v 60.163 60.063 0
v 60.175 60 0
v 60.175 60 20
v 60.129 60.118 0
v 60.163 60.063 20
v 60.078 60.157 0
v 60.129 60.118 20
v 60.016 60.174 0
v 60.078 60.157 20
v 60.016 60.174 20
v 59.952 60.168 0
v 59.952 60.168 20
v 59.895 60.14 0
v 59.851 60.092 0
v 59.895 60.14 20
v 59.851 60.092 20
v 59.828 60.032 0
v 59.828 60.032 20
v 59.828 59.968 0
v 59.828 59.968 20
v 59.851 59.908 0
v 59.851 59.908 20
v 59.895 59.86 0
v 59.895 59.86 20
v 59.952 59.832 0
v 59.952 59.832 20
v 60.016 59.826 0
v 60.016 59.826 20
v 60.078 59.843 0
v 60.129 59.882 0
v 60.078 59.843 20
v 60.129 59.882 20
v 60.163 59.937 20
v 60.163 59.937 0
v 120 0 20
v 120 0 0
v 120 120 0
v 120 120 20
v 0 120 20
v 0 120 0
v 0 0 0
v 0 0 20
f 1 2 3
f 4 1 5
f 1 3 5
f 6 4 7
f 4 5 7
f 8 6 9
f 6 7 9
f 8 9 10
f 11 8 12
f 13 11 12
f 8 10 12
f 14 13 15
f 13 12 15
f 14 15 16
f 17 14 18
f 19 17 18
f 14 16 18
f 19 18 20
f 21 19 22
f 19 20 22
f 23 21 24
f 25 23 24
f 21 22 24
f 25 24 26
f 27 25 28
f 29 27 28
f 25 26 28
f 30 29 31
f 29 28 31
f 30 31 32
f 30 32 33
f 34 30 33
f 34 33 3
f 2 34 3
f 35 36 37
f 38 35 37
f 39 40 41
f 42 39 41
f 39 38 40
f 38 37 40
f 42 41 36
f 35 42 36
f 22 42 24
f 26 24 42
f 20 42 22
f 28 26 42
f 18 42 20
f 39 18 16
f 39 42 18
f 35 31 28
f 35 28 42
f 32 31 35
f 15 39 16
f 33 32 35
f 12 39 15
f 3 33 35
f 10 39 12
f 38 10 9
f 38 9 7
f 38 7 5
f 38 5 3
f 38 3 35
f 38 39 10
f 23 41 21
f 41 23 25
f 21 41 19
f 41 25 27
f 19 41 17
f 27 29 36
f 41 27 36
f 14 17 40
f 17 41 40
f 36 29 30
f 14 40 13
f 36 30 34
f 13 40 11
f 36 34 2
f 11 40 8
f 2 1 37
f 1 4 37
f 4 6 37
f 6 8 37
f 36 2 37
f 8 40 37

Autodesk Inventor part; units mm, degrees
ref_plane "YZ Plane" through (0, 0, 0) normal (1, 0, 0) x (0, 1, 0)
ref_plane "XZ Plane" through (0, 0, 0) normal (0, 1, 0) x (-1, 0, 0)
ref_plane "XY Plane" through (0, 0, 0) normal (0, 0, 1) x (1, 0, 0)
sketch "Sketch1" plane through (0, 0, 0) normal (0, 0, 1) x (1, 0, 0)
  line L0 (0, 0) -> (120, 0)
  line L1 (120, 0) -> (120, 120)
  line L2 (120, 120) -> (0, 120)
  line L3 (0, 120) -> (0, 0)
  dimension "d0" = 120
  dimension "d1" = 120
extrude "Extrusion1" add sketch "Sketch1" along normal blind 20
sketch "Sketch2" plane through (0, 0, 20) normal (0, 0, 1) x (1, 0, 0)
  line L0 (0, 120) -> (0, 0) projected
  line L1 (0, 60) -> (60, 60)
  circle A0 centre (60, 60) radius 0.175
  circle A1 centre (60, 60) radius 0.175
  dimension "d4" = 60
  dimension "d5" = 0.35
  dimension "d6" = 0.35
extrude "Extrusion2" cut sketch "Sketch2" against normal through all
properties part number "BASE FOR IR"
